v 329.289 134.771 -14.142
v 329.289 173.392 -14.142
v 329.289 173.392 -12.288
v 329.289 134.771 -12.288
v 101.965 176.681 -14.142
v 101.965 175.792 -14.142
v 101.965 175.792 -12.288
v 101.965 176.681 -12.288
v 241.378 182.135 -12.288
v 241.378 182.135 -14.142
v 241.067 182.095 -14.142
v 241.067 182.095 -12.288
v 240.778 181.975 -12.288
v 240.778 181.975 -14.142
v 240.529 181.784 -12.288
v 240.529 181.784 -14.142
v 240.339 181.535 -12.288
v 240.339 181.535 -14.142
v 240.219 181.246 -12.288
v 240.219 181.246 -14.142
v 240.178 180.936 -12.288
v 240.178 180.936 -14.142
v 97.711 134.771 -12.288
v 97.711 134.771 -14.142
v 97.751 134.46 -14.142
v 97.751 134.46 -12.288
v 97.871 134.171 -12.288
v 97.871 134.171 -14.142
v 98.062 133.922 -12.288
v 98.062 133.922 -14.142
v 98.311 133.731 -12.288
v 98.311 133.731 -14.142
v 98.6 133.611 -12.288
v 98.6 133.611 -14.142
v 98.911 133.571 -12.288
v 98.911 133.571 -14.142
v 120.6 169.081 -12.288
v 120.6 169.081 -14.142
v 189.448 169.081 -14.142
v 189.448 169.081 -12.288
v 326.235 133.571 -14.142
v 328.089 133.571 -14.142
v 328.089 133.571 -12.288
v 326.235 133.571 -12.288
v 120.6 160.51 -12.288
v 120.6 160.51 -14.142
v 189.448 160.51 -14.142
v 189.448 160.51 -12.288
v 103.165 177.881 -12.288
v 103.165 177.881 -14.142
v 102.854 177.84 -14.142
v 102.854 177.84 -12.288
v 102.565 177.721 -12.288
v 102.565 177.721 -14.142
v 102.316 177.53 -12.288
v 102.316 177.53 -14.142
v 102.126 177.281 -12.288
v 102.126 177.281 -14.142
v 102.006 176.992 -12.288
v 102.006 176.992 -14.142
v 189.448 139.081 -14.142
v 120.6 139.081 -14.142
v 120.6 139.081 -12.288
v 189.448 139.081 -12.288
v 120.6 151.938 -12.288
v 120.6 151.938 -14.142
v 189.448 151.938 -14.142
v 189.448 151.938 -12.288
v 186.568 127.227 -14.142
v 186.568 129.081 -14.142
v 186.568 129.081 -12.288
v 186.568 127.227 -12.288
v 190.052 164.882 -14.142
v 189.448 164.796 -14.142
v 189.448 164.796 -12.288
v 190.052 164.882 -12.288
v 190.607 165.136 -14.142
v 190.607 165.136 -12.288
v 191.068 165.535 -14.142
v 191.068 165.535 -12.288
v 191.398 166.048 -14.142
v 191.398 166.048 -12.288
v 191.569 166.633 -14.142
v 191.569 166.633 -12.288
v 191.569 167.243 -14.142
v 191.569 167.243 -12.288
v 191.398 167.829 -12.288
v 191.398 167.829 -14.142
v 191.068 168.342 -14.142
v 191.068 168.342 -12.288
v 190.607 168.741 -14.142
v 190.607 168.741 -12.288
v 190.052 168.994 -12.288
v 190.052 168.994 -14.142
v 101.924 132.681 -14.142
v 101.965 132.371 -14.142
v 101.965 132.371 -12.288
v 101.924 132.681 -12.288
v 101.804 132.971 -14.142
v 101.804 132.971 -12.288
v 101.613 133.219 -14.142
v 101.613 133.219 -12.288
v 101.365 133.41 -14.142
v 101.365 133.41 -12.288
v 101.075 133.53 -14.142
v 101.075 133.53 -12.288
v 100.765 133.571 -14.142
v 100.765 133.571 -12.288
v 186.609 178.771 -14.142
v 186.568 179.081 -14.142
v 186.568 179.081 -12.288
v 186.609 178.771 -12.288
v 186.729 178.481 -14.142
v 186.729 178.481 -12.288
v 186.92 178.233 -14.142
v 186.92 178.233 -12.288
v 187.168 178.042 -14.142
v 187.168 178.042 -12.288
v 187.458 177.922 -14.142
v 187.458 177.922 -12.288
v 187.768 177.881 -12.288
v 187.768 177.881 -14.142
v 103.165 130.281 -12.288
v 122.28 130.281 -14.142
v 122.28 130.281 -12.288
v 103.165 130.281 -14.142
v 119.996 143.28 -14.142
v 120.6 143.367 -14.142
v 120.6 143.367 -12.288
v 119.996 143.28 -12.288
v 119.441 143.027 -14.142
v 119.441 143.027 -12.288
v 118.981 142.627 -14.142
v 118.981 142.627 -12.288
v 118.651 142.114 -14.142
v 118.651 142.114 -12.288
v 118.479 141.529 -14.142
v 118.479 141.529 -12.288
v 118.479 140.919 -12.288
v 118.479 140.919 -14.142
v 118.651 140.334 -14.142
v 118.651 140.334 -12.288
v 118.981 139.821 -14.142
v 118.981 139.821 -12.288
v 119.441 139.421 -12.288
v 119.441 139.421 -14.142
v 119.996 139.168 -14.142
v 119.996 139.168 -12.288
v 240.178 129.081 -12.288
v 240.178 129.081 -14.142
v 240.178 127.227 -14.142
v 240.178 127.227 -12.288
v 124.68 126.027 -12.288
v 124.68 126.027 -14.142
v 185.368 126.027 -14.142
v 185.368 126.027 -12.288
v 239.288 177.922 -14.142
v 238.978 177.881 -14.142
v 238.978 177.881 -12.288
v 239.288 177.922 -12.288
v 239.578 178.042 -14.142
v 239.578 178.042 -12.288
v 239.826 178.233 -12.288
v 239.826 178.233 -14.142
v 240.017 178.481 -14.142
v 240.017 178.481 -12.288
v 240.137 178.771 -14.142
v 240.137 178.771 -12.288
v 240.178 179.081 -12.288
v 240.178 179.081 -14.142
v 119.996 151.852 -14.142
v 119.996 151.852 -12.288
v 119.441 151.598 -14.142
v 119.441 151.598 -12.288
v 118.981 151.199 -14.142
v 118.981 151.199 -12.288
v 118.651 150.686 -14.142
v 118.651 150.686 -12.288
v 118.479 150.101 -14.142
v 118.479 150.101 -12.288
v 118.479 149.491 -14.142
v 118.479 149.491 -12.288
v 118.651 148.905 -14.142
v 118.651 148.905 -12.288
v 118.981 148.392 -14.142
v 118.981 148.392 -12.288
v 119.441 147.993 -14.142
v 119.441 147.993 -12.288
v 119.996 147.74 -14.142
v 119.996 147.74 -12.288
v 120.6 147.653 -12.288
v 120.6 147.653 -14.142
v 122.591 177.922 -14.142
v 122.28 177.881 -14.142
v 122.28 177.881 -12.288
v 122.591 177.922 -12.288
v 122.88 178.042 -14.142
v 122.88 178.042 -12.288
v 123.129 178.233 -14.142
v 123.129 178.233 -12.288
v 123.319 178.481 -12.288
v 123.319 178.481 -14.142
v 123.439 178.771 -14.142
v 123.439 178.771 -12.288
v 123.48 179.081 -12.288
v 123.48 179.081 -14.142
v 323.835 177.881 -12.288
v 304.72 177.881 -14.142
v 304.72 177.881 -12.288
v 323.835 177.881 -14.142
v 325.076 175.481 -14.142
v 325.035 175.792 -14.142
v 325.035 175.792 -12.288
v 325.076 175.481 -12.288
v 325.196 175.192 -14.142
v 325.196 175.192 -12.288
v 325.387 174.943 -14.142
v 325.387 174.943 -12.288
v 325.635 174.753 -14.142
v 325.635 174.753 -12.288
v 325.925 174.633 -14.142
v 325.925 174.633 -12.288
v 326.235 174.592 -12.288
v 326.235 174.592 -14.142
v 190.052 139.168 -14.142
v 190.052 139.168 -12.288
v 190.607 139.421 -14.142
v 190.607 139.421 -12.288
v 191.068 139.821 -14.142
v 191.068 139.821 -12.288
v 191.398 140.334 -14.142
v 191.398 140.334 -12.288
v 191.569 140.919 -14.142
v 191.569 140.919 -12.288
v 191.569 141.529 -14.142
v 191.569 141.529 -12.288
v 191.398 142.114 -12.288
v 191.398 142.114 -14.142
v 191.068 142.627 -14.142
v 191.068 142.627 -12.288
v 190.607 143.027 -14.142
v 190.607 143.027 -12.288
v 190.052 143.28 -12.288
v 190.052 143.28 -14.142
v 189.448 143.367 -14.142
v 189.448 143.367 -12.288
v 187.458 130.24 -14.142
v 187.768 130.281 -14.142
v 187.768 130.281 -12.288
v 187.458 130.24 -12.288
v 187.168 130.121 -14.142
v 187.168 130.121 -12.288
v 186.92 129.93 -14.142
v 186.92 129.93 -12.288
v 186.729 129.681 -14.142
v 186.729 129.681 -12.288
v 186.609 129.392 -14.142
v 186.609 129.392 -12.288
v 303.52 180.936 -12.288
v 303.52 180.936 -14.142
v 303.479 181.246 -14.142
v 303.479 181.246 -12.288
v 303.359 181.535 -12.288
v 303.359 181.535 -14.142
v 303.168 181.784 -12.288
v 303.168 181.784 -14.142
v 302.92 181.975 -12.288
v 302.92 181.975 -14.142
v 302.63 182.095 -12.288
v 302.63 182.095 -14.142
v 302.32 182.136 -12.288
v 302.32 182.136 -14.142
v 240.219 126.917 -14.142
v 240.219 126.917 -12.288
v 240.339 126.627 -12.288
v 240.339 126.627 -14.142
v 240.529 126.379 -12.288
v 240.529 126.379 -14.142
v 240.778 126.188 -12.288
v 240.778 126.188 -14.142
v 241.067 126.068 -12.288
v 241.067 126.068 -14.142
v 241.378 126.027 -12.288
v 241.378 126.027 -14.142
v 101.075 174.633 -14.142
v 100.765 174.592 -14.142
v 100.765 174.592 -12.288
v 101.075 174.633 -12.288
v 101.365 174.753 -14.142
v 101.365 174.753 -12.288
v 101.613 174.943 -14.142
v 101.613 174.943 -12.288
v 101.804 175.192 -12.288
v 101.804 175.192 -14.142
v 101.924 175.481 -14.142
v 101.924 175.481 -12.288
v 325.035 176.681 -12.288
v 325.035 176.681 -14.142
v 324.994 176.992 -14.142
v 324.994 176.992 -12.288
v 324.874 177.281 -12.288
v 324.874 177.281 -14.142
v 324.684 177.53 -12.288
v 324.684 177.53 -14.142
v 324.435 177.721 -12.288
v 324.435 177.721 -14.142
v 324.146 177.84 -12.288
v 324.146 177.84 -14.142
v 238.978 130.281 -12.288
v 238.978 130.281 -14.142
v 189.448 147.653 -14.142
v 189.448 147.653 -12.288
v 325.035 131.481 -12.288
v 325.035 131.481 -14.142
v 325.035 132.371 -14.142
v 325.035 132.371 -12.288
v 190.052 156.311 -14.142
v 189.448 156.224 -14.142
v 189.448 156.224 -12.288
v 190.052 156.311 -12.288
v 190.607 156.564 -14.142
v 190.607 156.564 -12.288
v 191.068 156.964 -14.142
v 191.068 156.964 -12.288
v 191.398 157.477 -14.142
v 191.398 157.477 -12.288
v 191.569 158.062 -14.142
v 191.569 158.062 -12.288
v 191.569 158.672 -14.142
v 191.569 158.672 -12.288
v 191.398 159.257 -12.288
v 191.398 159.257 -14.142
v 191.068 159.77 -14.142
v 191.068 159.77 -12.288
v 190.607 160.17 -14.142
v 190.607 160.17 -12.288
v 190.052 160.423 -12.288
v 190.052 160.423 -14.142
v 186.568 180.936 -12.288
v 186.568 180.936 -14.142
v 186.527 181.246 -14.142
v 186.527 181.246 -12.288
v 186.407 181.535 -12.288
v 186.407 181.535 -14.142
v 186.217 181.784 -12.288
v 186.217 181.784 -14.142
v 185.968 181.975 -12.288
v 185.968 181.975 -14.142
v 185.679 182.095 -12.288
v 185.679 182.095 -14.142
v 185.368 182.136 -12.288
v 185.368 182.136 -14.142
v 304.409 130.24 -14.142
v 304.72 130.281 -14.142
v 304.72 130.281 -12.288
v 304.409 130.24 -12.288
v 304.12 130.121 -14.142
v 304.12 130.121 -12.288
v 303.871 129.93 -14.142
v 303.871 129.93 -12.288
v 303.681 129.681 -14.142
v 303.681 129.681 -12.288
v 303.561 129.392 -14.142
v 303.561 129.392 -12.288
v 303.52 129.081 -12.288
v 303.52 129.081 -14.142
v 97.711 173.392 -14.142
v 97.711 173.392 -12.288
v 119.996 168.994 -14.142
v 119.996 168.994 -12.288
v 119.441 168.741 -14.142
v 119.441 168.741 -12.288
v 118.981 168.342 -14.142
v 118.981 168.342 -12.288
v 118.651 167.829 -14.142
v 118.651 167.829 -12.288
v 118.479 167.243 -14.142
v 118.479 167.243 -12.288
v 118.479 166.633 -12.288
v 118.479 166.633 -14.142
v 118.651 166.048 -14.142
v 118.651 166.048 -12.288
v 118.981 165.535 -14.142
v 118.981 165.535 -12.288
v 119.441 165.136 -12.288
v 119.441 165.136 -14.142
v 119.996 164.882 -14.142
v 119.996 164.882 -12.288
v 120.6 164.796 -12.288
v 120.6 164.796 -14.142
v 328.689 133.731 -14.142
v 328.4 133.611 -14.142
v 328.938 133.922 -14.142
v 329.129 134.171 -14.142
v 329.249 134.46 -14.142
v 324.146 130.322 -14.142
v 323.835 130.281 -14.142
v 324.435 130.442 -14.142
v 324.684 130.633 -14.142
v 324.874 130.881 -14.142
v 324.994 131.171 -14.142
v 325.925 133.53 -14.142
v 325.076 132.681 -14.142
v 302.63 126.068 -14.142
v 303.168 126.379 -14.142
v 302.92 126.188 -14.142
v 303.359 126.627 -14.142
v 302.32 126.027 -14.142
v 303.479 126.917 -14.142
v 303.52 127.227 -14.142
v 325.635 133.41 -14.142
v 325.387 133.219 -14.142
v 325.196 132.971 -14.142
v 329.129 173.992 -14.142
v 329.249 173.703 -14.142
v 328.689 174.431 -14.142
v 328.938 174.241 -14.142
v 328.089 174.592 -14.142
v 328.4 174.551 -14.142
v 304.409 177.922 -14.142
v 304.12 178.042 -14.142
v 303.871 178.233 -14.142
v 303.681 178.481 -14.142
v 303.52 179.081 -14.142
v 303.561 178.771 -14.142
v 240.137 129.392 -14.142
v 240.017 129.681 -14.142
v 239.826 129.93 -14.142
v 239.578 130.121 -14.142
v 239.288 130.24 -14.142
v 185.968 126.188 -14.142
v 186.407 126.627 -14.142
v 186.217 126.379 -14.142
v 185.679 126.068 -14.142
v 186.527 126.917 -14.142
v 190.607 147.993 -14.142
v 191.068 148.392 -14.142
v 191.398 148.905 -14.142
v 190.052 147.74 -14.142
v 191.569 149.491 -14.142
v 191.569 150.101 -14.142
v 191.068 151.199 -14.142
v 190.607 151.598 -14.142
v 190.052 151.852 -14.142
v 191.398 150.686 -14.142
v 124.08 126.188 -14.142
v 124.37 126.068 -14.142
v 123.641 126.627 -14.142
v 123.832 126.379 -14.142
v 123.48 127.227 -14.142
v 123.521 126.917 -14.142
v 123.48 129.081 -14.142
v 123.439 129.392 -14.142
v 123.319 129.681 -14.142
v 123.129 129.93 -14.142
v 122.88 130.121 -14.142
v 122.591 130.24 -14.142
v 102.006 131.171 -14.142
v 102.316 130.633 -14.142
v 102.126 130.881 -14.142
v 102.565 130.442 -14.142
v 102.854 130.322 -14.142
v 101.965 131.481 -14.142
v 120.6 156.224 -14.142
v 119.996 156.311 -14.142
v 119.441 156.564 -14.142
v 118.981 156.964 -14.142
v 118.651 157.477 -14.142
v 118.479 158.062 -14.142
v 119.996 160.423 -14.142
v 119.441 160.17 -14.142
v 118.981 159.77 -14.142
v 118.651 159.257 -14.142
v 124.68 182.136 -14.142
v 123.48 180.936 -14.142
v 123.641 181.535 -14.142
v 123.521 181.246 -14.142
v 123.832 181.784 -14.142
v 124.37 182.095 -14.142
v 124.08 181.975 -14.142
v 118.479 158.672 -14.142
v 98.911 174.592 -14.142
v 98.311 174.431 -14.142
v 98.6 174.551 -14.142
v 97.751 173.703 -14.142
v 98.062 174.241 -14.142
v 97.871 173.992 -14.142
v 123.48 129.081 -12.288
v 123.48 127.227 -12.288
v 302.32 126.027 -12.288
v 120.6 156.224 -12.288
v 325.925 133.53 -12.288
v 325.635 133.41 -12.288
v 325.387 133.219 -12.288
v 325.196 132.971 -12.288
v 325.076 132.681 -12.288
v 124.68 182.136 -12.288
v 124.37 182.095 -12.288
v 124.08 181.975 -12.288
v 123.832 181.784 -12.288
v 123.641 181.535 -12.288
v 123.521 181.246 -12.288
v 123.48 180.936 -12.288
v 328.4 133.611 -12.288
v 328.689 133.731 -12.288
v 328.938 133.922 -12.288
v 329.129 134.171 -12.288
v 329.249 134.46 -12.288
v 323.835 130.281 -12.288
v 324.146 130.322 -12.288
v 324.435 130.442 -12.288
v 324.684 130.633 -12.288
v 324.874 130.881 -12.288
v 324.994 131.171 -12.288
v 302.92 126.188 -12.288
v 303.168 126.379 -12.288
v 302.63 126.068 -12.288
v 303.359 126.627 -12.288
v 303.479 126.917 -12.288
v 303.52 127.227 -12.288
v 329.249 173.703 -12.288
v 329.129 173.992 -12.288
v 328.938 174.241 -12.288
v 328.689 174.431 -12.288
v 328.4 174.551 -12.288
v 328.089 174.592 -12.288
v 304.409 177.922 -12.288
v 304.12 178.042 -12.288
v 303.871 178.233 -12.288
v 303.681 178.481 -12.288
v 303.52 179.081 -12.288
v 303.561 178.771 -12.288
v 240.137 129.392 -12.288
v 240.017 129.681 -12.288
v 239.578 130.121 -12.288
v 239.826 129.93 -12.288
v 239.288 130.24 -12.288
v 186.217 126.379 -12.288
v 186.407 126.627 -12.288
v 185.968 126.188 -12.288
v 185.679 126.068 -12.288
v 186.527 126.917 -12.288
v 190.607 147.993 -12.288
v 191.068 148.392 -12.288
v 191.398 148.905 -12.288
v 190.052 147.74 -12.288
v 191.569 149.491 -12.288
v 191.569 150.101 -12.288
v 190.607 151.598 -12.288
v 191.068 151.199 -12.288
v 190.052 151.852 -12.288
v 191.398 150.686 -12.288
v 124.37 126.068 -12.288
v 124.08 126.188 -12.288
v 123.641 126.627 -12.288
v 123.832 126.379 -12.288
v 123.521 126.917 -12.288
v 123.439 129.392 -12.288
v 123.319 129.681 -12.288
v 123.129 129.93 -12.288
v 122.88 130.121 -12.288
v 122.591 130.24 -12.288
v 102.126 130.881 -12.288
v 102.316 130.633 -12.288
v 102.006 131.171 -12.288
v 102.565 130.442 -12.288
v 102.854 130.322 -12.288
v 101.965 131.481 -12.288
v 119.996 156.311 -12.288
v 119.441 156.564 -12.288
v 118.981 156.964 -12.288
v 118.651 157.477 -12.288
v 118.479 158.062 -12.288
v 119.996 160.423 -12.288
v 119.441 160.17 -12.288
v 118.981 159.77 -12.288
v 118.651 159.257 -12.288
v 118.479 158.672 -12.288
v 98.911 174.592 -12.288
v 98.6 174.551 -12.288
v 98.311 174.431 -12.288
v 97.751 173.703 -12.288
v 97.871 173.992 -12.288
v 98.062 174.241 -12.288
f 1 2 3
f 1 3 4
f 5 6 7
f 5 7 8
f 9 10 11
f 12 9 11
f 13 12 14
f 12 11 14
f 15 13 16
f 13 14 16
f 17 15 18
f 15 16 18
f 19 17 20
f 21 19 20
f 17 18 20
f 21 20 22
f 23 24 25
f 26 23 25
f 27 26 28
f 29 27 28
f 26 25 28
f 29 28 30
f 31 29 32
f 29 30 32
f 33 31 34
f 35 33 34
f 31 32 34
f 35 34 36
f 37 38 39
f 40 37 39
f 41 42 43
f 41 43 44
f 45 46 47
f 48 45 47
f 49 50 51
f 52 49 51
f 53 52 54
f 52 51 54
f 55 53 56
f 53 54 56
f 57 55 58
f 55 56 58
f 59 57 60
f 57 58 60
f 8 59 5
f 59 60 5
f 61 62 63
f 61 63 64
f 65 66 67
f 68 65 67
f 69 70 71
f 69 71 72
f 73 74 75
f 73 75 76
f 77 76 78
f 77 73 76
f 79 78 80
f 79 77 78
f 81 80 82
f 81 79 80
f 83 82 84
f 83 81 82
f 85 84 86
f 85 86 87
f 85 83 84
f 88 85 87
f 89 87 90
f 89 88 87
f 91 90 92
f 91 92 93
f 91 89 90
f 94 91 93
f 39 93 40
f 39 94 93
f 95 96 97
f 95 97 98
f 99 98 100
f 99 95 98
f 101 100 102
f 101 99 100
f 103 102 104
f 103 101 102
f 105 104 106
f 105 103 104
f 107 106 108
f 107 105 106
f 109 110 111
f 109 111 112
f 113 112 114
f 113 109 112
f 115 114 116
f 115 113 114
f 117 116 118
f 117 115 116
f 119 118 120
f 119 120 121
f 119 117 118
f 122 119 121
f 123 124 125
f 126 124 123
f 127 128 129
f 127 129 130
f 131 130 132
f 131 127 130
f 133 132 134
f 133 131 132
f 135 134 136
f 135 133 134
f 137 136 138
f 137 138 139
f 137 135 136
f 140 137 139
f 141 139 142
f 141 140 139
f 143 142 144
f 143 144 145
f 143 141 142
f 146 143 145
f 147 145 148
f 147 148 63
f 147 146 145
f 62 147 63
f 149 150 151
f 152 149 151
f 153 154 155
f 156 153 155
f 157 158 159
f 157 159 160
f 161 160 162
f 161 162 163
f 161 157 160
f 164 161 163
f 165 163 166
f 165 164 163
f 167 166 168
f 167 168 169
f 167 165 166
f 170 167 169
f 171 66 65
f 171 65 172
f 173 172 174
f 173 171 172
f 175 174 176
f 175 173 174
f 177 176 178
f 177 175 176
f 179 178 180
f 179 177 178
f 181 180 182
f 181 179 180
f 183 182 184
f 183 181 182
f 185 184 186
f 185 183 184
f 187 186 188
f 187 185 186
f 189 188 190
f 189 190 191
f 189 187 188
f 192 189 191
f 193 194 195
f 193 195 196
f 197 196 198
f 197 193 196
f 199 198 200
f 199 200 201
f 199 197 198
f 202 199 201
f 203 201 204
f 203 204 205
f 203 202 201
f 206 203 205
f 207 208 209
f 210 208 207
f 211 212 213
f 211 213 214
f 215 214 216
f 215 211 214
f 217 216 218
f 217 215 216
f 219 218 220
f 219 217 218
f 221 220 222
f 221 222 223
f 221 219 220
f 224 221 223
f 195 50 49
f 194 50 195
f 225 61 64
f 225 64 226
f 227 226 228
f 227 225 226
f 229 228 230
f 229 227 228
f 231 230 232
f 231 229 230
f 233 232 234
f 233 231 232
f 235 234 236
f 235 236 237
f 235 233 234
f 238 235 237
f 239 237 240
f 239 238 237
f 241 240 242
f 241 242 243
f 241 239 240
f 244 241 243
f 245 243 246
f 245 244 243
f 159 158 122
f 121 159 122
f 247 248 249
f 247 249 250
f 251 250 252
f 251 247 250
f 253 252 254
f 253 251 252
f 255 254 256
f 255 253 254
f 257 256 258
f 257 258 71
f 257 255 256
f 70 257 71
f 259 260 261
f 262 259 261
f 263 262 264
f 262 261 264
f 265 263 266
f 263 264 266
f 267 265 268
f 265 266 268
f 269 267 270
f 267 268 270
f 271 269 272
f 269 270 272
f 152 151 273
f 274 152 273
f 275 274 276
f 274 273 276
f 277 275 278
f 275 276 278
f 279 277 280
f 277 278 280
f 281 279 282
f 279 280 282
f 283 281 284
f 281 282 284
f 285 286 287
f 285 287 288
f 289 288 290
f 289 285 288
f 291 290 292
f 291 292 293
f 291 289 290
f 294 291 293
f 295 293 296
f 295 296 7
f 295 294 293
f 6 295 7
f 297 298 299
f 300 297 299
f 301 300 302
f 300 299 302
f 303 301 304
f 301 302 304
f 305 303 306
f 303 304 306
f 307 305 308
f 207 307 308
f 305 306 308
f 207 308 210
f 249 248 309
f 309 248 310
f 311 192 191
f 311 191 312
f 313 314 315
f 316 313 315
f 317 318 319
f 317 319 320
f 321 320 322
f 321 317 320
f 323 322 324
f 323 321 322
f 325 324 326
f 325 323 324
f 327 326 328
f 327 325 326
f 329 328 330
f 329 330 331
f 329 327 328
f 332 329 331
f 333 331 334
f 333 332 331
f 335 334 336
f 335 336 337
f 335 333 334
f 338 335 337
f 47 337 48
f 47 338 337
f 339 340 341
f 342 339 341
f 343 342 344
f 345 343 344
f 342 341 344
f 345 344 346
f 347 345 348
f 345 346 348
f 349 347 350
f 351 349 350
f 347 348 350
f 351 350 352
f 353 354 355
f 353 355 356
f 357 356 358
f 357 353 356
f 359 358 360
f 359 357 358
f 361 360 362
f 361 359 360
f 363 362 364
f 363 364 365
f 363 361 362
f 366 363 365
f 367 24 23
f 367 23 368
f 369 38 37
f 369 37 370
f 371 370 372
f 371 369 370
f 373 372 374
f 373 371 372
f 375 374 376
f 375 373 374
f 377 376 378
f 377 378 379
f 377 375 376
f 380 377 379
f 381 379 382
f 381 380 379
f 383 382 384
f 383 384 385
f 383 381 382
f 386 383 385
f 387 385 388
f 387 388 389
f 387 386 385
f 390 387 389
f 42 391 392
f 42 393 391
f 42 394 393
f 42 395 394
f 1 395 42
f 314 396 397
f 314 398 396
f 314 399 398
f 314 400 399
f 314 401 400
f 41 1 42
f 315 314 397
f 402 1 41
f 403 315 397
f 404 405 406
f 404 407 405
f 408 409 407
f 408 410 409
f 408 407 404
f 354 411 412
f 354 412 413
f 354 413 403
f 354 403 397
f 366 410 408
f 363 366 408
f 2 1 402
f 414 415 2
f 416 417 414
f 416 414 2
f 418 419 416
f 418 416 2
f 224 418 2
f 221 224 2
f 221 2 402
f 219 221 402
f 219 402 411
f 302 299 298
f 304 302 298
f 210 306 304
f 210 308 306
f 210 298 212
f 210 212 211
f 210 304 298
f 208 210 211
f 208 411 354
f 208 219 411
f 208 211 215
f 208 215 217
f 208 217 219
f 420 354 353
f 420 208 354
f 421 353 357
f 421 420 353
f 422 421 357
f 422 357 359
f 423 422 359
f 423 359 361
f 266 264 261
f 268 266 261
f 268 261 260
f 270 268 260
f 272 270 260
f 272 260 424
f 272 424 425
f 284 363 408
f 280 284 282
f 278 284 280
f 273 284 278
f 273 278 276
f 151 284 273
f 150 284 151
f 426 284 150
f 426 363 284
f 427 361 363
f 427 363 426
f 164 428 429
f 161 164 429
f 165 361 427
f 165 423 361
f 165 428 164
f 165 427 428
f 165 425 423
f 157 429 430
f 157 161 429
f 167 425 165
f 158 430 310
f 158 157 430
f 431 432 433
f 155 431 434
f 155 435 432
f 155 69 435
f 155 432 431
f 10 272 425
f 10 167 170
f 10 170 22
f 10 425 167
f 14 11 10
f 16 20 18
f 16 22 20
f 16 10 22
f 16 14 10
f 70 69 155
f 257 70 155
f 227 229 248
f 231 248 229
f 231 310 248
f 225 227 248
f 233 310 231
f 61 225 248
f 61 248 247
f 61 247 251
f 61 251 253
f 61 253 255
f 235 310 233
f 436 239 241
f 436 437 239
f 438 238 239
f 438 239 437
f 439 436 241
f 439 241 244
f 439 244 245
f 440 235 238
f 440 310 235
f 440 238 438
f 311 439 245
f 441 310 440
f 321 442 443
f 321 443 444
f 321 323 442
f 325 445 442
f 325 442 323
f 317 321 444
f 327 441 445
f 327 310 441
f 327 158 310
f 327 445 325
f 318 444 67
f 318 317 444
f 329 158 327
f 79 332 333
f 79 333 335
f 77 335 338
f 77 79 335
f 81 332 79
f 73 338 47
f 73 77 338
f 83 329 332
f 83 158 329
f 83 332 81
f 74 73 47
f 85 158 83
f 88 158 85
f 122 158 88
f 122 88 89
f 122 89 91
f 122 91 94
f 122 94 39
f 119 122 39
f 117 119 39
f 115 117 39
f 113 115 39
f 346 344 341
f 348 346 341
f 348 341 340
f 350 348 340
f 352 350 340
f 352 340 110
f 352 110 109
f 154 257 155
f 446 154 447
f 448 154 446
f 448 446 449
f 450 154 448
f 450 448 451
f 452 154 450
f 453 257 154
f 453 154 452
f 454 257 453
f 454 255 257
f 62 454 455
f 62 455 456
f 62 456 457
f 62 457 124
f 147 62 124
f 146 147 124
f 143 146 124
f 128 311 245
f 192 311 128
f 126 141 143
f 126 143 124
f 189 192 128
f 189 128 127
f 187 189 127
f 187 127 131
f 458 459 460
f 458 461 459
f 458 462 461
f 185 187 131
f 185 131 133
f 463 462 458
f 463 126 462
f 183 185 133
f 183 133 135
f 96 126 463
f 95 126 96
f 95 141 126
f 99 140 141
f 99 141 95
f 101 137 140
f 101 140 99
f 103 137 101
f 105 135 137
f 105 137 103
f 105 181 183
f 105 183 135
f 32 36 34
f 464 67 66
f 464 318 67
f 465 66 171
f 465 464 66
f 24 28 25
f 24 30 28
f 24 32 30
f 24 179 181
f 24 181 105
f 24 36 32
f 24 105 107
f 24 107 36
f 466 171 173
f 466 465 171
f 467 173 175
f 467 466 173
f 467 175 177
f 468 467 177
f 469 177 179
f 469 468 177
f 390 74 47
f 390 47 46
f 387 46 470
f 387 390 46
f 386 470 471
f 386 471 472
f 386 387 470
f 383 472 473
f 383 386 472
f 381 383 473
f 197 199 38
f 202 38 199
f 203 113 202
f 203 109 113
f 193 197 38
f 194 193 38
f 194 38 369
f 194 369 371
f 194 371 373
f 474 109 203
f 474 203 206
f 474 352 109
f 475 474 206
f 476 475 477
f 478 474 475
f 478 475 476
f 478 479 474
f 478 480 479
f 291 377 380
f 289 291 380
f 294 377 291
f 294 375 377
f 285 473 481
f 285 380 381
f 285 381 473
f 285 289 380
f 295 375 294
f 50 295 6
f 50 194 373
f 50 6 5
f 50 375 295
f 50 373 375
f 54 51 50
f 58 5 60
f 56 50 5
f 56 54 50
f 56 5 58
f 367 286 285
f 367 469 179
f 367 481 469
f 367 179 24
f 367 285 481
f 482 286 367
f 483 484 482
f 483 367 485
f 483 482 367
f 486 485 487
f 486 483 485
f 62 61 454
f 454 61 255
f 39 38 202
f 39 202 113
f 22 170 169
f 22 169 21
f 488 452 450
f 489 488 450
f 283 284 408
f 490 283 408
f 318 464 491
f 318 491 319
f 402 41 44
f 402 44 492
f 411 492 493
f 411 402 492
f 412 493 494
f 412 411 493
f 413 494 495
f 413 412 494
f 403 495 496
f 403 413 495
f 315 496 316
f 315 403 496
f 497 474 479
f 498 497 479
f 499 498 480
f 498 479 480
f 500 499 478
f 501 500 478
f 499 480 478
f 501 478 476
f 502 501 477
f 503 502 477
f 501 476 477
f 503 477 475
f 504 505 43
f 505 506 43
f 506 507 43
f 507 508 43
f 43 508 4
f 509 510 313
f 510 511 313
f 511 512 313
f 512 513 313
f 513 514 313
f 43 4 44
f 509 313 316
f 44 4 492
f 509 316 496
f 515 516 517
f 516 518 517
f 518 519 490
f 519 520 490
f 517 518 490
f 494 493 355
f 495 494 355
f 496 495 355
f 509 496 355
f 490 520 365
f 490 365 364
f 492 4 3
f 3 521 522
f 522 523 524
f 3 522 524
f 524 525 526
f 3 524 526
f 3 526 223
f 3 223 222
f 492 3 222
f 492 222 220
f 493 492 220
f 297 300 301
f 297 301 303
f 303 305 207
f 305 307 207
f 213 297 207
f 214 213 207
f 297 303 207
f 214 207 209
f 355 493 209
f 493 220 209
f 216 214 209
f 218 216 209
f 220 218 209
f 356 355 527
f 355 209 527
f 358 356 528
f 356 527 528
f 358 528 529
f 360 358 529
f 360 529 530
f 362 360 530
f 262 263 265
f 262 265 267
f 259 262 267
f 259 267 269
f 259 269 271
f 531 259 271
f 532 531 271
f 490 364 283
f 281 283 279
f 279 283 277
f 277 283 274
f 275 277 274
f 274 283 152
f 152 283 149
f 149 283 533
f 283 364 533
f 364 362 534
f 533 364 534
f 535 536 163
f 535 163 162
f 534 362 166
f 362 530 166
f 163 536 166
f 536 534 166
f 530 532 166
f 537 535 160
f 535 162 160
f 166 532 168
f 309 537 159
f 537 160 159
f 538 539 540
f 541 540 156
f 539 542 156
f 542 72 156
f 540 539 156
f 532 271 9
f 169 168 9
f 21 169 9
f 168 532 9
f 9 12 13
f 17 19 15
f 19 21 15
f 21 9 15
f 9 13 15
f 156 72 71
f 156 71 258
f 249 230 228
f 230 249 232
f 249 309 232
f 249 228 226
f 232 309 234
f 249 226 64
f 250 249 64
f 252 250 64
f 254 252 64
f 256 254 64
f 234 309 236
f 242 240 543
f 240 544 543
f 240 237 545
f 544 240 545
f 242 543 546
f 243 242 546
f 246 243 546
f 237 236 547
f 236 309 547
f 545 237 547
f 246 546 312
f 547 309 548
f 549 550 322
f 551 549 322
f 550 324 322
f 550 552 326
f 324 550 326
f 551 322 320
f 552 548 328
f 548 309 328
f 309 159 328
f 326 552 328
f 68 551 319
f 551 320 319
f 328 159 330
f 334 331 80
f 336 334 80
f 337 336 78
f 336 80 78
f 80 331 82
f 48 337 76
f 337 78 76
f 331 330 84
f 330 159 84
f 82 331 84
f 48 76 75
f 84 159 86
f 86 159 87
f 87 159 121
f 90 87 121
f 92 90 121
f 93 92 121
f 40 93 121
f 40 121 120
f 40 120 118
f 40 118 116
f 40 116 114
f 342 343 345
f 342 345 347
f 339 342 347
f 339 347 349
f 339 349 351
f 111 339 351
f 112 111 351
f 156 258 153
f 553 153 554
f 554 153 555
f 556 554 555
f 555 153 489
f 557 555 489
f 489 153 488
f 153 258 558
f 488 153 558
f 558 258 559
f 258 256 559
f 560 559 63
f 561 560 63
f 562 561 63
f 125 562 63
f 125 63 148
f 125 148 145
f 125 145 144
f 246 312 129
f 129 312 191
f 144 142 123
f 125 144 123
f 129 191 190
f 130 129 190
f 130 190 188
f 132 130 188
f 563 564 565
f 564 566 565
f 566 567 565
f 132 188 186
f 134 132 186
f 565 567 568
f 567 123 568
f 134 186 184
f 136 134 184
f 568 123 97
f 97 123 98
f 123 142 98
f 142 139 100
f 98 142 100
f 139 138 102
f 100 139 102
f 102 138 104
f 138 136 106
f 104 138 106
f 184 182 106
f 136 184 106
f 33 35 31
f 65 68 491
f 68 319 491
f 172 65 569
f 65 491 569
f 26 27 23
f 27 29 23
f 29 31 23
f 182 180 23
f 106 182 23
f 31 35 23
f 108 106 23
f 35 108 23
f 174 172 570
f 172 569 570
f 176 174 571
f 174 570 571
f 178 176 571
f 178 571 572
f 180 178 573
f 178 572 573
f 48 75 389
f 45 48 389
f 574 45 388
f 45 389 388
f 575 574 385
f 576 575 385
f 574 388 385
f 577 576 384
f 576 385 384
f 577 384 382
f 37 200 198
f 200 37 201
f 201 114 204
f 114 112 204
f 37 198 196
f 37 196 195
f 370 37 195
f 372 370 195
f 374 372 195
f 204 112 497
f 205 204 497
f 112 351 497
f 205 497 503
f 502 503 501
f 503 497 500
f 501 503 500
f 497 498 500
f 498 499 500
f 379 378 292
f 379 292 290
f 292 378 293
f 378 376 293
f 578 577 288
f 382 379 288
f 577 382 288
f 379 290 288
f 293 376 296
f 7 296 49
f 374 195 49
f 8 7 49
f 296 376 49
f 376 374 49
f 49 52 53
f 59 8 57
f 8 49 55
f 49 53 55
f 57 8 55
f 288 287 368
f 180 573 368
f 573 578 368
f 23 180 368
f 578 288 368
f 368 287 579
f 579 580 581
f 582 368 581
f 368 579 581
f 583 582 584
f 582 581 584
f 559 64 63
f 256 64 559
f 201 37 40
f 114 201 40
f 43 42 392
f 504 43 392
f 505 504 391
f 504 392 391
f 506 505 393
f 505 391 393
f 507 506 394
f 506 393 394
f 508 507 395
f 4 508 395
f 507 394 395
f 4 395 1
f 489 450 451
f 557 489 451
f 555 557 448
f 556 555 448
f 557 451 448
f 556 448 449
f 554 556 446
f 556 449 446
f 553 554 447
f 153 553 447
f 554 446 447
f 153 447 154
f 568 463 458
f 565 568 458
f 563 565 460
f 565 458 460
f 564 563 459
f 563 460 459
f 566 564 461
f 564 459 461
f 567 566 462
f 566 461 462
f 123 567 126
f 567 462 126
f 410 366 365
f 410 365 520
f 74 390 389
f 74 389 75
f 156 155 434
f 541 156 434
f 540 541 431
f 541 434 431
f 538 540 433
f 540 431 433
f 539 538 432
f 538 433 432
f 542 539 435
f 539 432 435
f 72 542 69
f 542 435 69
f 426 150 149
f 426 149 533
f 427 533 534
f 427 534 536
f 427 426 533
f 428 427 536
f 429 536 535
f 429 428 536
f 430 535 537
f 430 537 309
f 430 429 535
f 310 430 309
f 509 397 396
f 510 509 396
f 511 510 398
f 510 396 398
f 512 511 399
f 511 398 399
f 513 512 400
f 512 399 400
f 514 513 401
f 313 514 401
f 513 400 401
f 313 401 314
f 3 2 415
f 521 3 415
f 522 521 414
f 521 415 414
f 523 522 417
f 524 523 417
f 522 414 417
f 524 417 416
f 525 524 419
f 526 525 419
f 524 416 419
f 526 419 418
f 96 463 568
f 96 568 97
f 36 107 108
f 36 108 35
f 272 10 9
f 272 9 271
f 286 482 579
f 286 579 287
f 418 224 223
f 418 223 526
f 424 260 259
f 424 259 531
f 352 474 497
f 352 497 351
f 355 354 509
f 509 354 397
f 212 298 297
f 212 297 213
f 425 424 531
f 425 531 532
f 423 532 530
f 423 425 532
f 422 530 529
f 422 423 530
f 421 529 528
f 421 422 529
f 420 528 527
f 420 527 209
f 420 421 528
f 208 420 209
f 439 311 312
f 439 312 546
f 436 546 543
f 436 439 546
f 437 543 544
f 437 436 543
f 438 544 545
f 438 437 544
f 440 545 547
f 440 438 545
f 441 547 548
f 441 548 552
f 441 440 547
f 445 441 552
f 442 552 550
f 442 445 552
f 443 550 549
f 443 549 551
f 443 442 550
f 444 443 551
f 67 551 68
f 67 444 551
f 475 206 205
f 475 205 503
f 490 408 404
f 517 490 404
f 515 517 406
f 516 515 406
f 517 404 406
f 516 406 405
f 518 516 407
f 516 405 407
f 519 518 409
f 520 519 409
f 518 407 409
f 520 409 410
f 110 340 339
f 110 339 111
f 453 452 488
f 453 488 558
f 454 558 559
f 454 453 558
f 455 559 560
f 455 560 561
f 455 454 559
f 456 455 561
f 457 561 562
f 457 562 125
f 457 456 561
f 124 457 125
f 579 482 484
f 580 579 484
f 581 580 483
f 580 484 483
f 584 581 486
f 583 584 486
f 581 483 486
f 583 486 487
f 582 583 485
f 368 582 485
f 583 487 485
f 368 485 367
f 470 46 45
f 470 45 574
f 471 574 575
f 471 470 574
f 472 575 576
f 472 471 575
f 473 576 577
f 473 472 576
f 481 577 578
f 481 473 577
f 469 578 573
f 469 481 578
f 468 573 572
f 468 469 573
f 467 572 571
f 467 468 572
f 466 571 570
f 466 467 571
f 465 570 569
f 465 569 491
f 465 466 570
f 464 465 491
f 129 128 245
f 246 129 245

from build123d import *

# Parameters (mm, degrees)
PAD_DEPTH = 1.8542


with BuildPart() as part:
    # Sketch (on Face54 of Binder001) → Pad (new body)
    with BuildSketch(Plane.XY.offset(-14.1418)):
        with BuildLine():
            Line((326.2352, 174.592), (328.0894, 174.592))
            ThreePointArc((329.2894, 173.392), (328.937928, 174.240528), (328.0894, 174.592))
            Line((329.2894, 173.392), (329.2894, 134.7706))
            ThreePointArc((328.0894, 133.5706), (328.937928, 133.922072), (329.2894, 134.7706))
            Line((328.0894, 133.5706), (326.2352, 133.5706))
            ThreePointArc((326.2352, 133.5706), (325.386672, 133.219128), (325.0352, 132.3706))
            Line((325.0352, 131.4813), (325.0352, 132.3706))
            ThreePointArc((323.8352, 130.2813), (324.683728, 130.632772), (325.0352, 131.4813))
            Line((304.7198, 130.2813), (323.8352, 130.2813))
            ThreePointArc((304.7198, 130.2813), (303.871272, 129.929828), (303.5198, 129.0813))
            Line((303.5198, 129.0813), (303.5198, 127.2271))
            ThreePointArc((302.3198, 126.0271), (303.168328, 126.378572), (303.5198, 127.2271))
            Line((241.3778, 126.0271), (302.3198, 126.0271))
            ThreePointArc((240.1778, 127.2271), (240.529272, 126.378572), (241.3778, 126.0271))
            Line((240.1778, 129.0813), (240.1778, 127.2271))
            ThreePointArc((240.1778, 129.0813), (239.826328, 129.929828), (238.9778, 130.2813))
            Line((187.7682, 130.2813), (238.9778, 130.2813))
            ThreePointArc((187.7682, 130.2813), (186.919672, 129.929828), (186.5682, 129.0813))
            Line((186.5682, 129.0813), (186.5682, 127.2271))
            ThreePointArc((185.3682, 126.0271), (186.216728, 126.378572), (186.5682, 127.2271))
            Line((124.6802, 126.0271), (185.3682, 126.0271))
            ThreePointArc((123.4802, 127.2271), (123.831672, 126.378572), (124.6802, 126.0271))
            Line((123.4802, 129.0813), (123.4802, 127.2271))
            ThreePointArc((123.4802, 129.0813), (123.128728, 129.929828), (122.2802, 130.2813))
            Line((122.2802, 130.2813), (103.1648, 130.2813))
            ThreePointArc((101.9648, 131.4813), (102.316272, 130.632772), (103.1648, 130.2813))
            Line((101.9648, 131.4813), (101.9648, 132.3706))
            ThreePointArc((101.9648, 132.3706), (101.613328, 133.219128), (100.7648, 133.5706))
            Line((100.7648, 133.5706), (98.9106, 133.5706))
            ThreePointArc((97.7106, 134.7706), (98.062072, 133.922072), (98.9106, 133.5706))
            Line((97.7106, 134.7706), (97.7106, 173.392))
            ThreePointArc((98.9106, 174.592), (98.062072, 174.240528), (97.7106, 173.392))
            Line((98.9106, 174.592), (100.7648, 174.592))
            ThreePointArc((100.7648, 174.592), (101.613328, 174.943472), (101.9648, 175.792))
            Line((101.9648, 175.792), (101.9648, 176.6813))
            ThreePointArc((103.1648, 177.8813), (102.316272, 177.529828), (101.9648, 176.6813))
            Line((103.1648, 177.8813), (122.2802, 177.8813))
            ThreePointArc((122.2802, 177.8813), (123.128728, 178.232772), (123.4802, 179.0813))
            Line((123.4802, 179.0813), (123.4802, 180.9355))
            ThreePointArc((124.6802, 182.1355), (123.831672, 181.784028), (123.4802, 180.9355))
            Line((124.6802, 182.1355), (185.3682, 182.1355))
            ThreePointArc((186.5682, 180.9355), (186.216728, 181.784028), (185.3682, 182.1355))
            Line((186.5682, 180.9355), (186.5682, 179.0813))
            ThreePointArc((186.5682, 179.0813), (186.919672, 178.232772), (187.7682, 177.8813))
            Line((238.9778, 177.8813), (187.7682, 177.8813))
            ThreePointArc((238.9778, 177.8813), (239.826328, 178.232772), (240.1778, 179.0813))
            Line((240.1778, 179.0813), (240.1778, 180.9355))
            ThreePointArc((241.3778, 182.1355), (240.529272, 181.784028), (240.1778, 180.9355))
            Line((241.3778, 182.1355), (302.3198, 182.1355))
            ThreePointArc((303.5198, 180.9355), (303.168328, 181.784028), (302.3198, 182.1355))
            Line((303.5198, 180.9355), (303.5198, 179.0813))
            ThreePointArc((303.5198, 179.0813), (303.871272, 178.232772), (304.7198, 177.8813))
            Line((304.7198, 177.8813), (323.8352, 177.8813))
            ThreePointArc((325.0352, 176.6813), (324.683728, 177.529828), (323.8352, 177.8813))
            Line((325.0352, 176.6813), (325.0352, 175.792))
            ThreePointArc((325.0352, 175.792), (325.386672, 174.943472), (326.2352, 174.592))
        make_face()
        with BuildLine():
            ThreePointArc((120.6, 143.367014), (118.457143, 141.224157), (120.6, 139.0813))
            Line((120.6, 139.0813), (189.4484, 139.0813))
            ThreePointArc((189.4484, 139.0813), (191.591257, 141.224157), (189.4484, 143.367014))
            Line((120.6, 143.367014), (189.4484, 143.367014))
        make_face(mode=Mode.SUBTRACT)
        with BuildLine():
            ThreePointArc((120.6, 151.938443), (118.457143, 149.795586), (120.6, 147.652729))
            Line((120.6, 147.652729), (189.4484, 147.652729))
            ThreePointArc((189.4484, 147.652729), (191.591257, 149.795586), (189.4484, 151.938443))
            Line((120.6, 151.938443), (189.4484, 151.938443))
        make_face(mode=Mode.SUBTRACT)
        with BuildLine():
            ThreePointArc((120.6, 160.509871), (118.457143, 158.367014), (120.6, 156.224157))
            Line((120.6, 156.224157), (189.4484, 156.224157))
            ThreePointArc((189.4484, 156.224157), (191.591257, 158.367014), (189.4484, 160.509871))
            Line((120.6, 160.509871), (189.4484, 160.509871))
        make_face(mode=Mode.SUBTRACT)
        with BuildLine():
            ThreePointArc((120.6, 169.0813), (118.457143, 166.938443), (120.6, 164.795586))
            Line((120.6, 164.795586), (189.4484, 164.795586))
            ThreePointArc((189.4484, 164.795586), (191.591257, 166.938443), (189.4484, 169.0813))
            Line((120.6, 169.0813), (189.4484, 169.0813))
        make_face(mode=Mode.SUBTRACT)
    extrude(amount=PAD_DEPTH)


solid = part.part
